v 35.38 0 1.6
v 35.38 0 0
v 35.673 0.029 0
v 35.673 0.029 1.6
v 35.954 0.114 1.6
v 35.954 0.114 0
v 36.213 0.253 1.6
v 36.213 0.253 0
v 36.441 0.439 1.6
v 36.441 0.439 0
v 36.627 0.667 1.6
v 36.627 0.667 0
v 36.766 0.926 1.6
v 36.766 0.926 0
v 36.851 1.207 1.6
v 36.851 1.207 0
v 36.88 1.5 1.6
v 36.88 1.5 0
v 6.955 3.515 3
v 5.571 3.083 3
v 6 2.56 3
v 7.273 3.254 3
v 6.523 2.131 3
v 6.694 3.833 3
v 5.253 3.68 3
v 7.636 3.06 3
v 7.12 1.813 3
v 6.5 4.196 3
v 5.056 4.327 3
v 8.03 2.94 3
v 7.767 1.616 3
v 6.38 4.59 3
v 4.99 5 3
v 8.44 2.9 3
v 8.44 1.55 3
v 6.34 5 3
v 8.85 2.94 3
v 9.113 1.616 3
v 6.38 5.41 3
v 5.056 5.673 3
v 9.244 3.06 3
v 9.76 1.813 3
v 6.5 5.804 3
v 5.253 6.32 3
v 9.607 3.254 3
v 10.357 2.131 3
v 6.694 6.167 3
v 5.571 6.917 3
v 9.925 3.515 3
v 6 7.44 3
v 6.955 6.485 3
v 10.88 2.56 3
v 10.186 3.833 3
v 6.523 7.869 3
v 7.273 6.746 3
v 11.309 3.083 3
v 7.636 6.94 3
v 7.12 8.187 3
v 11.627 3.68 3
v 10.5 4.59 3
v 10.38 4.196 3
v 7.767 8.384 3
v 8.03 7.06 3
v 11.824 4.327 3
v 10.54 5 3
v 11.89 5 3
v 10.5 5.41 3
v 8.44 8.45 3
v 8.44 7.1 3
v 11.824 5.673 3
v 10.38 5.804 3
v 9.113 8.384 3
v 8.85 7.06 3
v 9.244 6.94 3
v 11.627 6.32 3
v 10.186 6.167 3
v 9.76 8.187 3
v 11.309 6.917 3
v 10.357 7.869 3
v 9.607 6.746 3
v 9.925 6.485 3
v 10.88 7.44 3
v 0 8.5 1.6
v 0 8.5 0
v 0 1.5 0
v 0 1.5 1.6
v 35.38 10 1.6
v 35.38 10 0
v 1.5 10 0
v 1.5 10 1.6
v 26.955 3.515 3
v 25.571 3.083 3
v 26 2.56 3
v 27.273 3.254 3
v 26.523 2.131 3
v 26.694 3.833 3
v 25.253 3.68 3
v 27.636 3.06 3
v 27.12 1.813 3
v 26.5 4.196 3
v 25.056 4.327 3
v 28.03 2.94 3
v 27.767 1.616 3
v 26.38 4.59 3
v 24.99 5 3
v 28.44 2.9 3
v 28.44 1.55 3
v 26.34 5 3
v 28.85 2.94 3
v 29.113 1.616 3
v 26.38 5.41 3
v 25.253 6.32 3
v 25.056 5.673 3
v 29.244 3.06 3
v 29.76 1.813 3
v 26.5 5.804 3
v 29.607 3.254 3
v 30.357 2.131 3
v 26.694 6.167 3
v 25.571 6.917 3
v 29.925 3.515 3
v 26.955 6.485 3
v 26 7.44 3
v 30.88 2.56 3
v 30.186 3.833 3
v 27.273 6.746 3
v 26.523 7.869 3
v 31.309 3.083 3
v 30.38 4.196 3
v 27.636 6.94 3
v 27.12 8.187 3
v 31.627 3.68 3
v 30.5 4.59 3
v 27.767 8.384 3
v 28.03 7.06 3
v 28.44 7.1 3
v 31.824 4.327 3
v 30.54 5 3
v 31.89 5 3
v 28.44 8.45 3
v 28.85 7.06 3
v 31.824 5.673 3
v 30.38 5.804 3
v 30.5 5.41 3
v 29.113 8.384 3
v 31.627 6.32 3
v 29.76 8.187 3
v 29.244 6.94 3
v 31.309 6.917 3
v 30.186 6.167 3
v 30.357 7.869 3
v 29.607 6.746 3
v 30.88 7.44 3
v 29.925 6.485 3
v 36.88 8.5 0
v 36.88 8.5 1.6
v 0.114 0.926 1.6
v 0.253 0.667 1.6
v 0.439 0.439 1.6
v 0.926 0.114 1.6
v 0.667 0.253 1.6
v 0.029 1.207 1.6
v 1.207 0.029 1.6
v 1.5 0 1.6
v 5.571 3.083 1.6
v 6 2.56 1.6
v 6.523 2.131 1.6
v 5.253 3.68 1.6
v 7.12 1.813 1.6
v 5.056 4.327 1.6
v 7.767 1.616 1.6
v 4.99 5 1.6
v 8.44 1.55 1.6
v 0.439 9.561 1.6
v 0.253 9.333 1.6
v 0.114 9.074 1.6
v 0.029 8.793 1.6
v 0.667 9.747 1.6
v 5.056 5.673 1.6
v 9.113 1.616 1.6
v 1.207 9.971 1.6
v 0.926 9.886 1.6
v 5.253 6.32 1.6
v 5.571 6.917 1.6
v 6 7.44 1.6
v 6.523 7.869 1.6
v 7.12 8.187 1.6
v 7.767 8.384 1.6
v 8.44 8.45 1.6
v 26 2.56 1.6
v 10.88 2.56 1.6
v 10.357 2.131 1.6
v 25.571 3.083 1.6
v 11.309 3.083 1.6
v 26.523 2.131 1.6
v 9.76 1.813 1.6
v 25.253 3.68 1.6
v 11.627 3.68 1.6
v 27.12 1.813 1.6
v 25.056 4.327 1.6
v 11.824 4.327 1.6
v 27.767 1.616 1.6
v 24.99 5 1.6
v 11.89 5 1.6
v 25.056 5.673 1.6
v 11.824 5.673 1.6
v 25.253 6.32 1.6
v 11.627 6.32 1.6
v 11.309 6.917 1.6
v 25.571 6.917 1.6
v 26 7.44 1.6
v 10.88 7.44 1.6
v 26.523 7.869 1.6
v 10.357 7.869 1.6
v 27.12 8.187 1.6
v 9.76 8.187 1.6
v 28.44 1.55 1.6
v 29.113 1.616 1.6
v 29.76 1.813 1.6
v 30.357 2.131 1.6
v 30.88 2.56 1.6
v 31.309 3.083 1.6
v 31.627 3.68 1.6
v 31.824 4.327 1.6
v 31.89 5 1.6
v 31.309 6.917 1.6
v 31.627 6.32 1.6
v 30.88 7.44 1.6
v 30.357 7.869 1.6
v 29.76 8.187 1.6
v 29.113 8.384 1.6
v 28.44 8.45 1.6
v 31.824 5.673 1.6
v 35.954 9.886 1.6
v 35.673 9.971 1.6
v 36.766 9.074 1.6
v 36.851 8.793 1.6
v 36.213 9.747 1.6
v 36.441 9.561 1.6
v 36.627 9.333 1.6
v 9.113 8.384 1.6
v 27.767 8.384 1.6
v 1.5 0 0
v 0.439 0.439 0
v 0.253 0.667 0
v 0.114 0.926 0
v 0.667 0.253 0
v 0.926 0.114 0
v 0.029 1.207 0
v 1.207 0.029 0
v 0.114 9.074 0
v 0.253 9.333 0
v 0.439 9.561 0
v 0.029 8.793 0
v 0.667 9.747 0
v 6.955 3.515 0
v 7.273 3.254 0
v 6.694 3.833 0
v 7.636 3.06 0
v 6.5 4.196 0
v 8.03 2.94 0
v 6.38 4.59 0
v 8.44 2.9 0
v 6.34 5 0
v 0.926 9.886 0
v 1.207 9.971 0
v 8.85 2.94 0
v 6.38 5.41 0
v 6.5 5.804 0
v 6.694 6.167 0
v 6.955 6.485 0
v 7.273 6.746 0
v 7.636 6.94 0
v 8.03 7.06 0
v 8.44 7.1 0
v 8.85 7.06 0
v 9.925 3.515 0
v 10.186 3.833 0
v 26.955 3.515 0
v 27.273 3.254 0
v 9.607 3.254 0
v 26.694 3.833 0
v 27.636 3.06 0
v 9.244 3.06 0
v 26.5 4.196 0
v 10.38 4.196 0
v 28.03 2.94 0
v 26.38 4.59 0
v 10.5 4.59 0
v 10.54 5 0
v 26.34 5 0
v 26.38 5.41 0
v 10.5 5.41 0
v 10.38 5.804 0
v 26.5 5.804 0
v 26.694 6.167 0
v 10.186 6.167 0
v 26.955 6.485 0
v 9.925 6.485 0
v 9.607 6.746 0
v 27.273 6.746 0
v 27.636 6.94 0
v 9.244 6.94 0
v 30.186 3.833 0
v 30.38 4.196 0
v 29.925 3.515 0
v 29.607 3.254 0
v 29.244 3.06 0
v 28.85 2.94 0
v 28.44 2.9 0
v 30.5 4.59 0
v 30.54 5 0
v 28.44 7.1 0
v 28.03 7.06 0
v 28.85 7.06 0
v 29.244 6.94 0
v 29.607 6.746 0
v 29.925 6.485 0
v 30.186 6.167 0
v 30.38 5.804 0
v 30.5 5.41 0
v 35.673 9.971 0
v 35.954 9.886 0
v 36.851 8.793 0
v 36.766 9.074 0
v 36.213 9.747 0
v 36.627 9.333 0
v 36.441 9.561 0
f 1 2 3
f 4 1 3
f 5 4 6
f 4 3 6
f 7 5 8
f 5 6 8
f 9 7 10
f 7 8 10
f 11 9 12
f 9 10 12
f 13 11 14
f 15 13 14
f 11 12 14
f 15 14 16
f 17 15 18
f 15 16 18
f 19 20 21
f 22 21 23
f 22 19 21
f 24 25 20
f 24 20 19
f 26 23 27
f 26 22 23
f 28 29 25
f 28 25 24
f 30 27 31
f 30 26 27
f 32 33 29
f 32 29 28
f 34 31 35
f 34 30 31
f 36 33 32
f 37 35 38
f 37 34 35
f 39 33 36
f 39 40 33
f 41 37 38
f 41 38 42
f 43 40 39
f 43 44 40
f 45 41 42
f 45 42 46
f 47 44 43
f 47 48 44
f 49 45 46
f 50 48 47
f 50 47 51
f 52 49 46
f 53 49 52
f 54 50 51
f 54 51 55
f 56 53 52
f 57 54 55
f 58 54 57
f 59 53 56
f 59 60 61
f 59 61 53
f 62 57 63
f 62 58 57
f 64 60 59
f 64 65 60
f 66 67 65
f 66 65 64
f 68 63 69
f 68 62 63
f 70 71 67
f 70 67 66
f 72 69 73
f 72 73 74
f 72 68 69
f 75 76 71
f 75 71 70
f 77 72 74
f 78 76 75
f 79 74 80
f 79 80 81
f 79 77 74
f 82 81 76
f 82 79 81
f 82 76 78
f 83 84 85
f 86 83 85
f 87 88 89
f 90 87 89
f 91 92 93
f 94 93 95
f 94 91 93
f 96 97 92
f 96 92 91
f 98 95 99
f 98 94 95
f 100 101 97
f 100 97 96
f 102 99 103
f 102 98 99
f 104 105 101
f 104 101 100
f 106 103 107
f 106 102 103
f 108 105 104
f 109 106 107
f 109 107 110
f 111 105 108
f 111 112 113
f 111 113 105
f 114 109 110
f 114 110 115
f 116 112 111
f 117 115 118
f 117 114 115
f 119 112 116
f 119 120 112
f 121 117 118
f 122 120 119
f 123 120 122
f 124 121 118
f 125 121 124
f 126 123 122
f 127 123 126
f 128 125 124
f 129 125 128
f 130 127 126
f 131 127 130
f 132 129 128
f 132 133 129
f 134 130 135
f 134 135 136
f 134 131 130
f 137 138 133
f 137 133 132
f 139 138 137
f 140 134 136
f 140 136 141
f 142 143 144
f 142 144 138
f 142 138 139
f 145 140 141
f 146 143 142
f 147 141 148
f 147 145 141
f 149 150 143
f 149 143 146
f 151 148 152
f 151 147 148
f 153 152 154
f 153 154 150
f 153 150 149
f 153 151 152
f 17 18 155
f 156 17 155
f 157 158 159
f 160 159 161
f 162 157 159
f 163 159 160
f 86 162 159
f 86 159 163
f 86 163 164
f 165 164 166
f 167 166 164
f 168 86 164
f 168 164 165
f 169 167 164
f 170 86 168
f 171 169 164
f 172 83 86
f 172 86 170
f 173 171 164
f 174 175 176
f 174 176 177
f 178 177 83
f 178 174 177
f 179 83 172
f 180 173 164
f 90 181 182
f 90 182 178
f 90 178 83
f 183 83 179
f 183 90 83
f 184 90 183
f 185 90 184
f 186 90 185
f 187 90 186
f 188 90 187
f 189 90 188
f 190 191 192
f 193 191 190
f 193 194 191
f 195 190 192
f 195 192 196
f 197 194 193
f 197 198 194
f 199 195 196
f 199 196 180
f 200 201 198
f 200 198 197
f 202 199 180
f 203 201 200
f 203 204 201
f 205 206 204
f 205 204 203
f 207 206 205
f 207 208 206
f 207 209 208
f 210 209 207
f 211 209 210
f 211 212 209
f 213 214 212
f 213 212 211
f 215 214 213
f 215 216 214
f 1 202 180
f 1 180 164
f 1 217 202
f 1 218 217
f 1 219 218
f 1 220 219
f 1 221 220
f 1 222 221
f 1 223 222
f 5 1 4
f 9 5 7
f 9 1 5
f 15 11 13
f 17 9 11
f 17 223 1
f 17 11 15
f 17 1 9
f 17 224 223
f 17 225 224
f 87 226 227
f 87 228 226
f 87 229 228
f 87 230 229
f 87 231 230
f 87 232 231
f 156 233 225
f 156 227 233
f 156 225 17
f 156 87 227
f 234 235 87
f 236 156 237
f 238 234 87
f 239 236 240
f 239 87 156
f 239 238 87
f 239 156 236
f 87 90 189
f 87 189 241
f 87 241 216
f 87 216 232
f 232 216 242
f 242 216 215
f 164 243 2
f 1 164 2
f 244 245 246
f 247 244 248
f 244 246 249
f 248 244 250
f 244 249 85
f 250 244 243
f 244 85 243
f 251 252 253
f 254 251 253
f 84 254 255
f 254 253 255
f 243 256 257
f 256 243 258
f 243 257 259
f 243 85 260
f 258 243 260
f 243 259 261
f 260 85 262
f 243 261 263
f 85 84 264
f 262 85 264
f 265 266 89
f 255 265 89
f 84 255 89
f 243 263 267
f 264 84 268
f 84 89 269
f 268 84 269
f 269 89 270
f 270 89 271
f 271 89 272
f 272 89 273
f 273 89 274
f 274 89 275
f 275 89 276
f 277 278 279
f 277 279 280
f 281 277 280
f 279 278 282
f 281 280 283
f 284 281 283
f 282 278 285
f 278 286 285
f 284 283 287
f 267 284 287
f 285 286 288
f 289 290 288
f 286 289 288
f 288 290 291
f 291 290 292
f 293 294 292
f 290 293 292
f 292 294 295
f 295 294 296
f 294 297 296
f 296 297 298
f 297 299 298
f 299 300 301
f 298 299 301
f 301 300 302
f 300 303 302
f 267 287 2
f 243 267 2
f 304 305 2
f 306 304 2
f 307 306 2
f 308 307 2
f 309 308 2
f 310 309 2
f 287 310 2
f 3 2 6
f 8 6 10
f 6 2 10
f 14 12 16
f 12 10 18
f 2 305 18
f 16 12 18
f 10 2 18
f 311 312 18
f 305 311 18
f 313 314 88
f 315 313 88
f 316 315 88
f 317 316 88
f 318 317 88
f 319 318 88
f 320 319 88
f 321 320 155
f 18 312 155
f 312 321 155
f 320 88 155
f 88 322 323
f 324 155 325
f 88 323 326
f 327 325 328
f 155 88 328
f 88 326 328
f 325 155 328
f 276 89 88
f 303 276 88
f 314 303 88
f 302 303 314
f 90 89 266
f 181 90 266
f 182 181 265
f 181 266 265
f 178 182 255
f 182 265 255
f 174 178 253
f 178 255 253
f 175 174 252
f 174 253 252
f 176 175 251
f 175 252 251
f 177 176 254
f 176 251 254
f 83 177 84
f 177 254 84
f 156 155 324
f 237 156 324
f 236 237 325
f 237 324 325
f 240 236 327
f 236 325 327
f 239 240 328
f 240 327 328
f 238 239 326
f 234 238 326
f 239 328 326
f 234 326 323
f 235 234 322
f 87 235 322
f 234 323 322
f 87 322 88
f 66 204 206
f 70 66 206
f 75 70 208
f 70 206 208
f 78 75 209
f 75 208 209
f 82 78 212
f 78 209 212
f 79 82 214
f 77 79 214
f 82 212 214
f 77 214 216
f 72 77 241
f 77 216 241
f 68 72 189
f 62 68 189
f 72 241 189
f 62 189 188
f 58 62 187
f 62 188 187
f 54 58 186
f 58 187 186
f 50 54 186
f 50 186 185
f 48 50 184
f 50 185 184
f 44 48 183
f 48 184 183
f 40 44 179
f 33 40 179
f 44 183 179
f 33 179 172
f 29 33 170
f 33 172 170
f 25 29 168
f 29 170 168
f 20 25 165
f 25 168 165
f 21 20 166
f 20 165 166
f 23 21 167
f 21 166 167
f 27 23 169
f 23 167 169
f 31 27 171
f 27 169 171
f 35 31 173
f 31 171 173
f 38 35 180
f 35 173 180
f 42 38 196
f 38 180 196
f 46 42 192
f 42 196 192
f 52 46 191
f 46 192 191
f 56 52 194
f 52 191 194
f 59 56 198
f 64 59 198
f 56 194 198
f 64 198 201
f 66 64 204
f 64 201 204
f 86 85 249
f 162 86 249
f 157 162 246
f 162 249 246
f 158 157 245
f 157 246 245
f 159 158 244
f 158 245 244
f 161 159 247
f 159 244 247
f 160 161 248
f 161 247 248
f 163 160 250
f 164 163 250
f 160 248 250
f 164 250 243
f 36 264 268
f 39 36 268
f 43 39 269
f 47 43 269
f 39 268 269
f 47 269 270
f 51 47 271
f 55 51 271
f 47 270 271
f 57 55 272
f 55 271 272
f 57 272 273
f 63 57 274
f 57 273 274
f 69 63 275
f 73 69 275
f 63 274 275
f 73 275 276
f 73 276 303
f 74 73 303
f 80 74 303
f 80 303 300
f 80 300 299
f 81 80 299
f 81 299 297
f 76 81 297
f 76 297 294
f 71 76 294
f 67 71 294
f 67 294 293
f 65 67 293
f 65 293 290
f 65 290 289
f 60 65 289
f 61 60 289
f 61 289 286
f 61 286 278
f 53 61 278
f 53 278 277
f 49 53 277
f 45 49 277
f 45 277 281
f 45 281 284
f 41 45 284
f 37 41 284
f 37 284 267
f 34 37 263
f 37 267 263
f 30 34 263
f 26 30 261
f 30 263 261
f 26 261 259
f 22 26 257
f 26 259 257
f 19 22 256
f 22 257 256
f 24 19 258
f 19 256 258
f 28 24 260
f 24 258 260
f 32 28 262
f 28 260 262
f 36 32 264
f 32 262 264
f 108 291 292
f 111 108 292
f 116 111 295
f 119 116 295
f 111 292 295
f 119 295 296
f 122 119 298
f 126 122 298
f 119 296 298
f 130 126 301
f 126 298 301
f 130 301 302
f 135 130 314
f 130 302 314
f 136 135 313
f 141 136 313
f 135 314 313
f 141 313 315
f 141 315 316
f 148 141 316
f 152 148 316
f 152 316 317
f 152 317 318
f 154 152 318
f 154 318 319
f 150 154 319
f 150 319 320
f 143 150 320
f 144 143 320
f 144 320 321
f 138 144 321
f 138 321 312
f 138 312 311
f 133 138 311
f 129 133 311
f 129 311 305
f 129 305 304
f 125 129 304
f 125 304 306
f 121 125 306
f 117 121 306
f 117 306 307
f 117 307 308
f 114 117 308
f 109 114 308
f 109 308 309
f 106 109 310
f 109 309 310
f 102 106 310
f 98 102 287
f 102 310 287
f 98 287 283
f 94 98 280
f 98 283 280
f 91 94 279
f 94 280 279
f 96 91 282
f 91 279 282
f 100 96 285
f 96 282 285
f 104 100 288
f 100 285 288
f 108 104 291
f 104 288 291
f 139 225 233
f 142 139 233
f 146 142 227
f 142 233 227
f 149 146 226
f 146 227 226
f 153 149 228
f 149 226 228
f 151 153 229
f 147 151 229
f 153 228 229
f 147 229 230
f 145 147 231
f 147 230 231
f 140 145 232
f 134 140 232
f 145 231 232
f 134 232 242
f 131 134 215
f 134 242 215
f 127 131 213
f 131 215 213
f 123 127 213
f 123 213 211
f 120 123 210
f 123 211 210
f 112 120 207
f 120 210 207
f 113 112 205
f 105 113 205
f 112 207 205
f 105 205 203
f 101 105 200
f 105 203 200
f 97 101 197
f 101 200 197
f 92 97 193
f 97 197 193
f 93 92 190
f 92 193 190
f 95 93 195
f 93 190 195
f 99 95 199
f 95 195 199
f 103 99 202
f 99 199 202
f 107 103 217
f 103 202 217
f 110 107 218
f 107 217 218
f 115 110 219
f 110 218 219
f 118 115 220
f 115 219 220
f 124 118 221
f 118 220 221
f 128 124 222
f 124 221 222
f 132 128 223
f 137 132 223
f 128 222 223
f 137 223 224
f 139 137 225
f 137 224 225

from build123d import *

# Parameters (mm, degrees)
BOSS_EXTRUDE1_DEPTH   = 1.6
SKETCH2_R             = 3.45
BOSS_EXTRUDE2_DEPTH   = 1.4
M5X0_8_TAPPED_HOLE1_D = 4.2


with BuildPart() as part:
    # Sketch1 → Boss-Extrude1 (new body)
    with BuildSketch(Plane.XY):
        with BuildLine():
            Line((1.5, 0), (35.38, 0))
            ThreePointArc((35.38, 0), (36.440660172, 0.439339828), (36.88, 1.5))
            Line((36.88, 1.5), (36.88, 8.5))
            ThreePointArc((36.88, 8.5), (36.440660172, 9.560660172), (35.38, 10))
            Line((35.38, 10), (1.5, 10))
            ThreePointArc((1.5, 10), (0.439339828, 9.560660172), (0, 8.5))
            Line((0, 8.5), (0, 1.5))
            ThreePointArc((0, 1.5), (0.439339828, 0.439339828), (1.5, 0))
        make_face()
    extrude(amount=BOSS_EXTRUDE1_DEPTH)

    # Sketch2 → Boss-Extrude2 (add)
    with BuildSketch(Plane.XY.offset(1.6)):
        with Locations((8.44, 5)):
            Circle(SKETCH2_R)
        with Locations((28.44, 5)):
            Circle(SKETCH2_R)
    extrude(amount=BOSS_EXTRUDE2_DEPTH)

    # M5x0.8 Tapped Hole1 (through all)
    with Locations(Plane.XY.offset(3)):
        with Locations((8.44, 5), (28.44, 5)):
            Hole(M5X0_8_TAPPED_HOLE1_D / 2)


solid = part.part
